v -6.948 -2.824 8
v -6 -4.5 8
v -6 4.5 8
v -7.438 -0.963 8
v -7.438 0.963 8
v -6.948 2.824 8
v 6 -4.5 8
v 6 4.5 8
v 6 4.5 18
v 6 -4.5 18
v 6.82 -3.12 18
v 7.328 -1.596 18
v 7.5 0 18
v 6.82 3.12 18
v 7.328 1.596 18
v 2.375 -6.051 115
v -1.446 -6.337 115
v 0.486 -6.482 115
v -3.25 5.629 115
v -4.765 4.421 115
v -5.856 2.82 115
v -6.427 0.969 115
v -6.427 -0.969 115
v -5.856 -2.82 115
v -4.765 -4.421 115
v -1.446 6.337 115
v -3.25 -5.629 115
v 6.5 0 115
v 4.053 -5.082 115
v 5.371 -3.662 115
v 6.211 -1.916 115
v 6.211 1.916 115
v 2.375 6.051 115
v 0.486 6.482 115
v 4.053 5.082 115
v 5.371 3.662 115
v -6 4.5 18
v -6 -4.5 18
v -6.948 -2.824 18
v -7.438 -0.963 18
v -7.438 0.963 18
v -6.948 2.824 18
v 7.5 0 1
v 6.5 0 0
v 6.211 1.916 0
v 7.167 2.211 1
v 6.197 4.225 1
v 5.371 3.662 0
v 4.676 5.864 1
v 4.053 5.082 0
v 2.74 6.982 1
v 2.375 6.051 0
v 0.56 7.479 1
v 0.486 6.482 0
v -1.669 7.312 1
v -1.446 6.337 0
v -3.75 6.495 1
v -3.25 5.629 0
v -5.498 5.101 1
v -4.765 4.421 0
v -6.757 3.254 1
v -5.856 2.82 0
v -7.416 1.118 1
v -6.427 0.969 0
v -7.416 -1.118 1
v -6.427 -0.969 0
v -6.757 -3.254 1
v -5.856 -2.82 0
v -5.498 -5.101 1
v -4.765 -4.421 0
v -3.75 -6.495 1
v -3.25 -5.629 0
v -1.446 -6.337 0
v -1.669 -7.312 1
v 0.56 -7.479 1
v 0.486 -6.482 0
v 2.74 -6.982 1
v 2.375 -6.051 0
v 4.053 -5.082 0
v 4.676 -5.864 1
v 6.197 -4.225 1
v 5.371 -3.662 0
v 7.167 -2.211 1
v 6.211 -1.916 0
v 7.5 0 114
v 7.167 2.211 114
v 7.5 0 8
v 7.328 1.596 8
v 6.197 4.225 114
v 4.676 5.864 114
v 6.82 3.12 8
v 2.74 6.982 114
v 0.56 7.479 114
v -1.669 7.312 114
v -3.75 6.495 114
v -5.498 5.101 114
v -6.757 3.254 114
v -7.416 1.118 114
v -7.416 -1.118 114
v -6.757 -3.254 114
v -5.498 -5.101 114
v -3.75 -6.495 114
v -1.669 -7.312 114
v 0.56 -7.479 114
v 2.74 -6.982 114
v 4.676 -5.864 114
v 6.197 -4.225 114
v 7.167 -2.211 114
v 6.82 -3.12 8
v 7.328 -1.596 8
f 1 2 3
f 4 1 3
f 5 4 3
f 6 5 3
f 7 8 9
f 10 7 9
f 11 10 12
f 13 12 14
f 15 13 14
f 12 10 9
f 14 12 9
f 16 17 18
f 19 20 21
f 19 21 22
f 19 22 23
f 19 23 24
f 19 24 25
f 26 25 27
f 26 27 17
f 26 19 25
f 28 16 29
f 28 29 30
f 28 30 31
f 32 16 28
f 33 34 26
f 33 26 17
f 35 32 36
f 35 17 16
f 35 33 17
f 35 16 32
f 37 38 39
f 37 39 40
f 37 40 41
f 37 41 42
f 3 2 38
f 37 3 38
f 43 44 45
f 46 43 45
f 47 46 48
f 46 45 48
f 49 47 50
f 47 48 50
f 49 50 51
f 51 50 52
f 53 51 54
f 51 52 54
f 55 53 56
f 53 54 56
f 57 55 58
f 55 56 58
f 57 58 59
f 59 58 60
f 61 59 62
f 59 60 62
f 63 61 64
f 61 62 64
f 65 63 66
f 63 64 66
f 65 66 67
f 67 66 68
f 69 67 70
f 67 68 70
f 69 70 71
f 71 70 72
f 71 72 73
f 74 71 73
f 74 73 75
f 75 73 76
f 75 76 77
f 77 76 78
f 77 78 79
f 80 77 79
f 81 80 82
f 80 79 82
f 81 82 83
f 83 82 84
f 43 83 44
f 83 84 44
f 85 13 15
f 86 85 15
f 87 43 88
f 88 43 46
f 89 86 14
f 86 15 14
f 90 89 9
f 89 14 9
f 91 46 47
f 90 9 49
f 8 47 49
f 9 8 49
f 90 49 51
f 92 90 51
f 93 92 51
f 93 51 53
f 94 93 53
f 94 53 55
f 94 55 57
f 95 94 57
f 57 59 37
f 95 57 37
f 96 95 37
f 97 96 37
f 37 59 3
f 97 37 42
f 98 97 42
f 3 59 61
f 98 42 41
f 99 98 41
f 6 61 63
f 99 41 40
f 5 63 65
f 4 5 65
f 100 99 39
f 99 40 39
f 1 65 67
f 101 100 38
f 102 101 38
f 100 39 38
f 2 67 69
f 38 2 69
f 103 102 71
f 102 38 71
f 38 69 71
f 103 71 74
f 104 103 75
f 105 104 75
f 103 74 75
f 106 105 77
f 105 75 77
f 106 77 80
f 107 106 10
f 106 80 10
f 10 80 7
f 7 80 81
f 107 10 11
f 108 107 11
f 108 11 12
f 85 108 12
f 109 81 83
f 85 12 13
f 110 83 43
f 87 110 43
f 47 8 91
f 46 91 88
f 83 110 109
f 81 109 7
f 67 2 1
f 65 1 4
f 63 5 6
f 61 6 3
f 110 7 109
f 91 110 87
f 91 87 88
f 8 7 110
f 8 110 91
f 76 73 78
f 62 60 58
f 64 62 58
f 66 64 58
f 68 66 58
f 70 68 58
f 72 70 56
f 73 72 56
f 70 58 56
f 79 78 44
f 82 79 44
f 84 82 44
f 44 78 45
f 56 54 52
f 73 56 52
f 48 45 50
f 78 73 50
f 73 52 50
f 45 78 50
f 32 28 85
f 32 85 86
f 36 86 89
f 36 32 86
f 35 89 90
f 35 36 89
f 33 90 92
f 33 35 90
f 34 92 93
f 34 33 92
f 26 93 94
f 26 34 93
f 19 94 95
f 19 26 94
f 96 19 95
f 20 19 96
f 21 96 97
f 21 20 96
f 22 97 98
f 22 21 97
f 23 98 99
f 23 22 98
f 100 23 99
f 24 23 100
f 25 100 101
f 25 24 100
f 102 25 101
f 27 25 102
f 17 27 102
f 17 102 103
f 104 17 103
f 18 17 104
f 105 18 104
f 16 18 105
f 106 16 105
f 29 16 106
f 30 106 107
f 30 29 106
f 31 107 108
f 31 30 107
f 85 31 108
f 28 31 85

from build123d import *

# Parameters (mm, degrees)
F0_R          = 7.5
F1_DEPTH      = 115
F2_SIZE2      = 1
F2_SIZE       = 1
F3_W          = 1.5
F3_H          = 10
F4_DEPTH      = 7.501
F4_DEPTH_BACK = 7.501


with BuildPart() as f1:
    # F0 (on Top) → F1 (new body)
    with BuildSketch(Plane.XY):
        Circle(F0_R)
    extrude(amount=F1_DEPTH)

    # F2
    f2_edges = [f1.edges().sort_by_distance(p)[0] for p in [
        (-7.5, 0, 115),
        (-7.5, 0, 0),
    ]]
    chamfer(f2_edges, length=F2_SIZE, length2=F2_SIZE2)

    # F3 (on Front) → F4 (cut, two sides)
    with BuildSketch(Plane.XZ) as f4_sk:
        with Locations((6.75, 13)):
            Rectangle(F3_W, F3_H)
        with Locations((-6.75, 13)):
            Rectangle(F3_W, F3_H)
    extrude(amount=F4_DEPTH, mode=Mode.SUBTRACT)
    extrude(f4_sk.sketch, amount=-F4_DEPTH_BACK, mode=Mode.SUBTRACT)


solid = f1.part
